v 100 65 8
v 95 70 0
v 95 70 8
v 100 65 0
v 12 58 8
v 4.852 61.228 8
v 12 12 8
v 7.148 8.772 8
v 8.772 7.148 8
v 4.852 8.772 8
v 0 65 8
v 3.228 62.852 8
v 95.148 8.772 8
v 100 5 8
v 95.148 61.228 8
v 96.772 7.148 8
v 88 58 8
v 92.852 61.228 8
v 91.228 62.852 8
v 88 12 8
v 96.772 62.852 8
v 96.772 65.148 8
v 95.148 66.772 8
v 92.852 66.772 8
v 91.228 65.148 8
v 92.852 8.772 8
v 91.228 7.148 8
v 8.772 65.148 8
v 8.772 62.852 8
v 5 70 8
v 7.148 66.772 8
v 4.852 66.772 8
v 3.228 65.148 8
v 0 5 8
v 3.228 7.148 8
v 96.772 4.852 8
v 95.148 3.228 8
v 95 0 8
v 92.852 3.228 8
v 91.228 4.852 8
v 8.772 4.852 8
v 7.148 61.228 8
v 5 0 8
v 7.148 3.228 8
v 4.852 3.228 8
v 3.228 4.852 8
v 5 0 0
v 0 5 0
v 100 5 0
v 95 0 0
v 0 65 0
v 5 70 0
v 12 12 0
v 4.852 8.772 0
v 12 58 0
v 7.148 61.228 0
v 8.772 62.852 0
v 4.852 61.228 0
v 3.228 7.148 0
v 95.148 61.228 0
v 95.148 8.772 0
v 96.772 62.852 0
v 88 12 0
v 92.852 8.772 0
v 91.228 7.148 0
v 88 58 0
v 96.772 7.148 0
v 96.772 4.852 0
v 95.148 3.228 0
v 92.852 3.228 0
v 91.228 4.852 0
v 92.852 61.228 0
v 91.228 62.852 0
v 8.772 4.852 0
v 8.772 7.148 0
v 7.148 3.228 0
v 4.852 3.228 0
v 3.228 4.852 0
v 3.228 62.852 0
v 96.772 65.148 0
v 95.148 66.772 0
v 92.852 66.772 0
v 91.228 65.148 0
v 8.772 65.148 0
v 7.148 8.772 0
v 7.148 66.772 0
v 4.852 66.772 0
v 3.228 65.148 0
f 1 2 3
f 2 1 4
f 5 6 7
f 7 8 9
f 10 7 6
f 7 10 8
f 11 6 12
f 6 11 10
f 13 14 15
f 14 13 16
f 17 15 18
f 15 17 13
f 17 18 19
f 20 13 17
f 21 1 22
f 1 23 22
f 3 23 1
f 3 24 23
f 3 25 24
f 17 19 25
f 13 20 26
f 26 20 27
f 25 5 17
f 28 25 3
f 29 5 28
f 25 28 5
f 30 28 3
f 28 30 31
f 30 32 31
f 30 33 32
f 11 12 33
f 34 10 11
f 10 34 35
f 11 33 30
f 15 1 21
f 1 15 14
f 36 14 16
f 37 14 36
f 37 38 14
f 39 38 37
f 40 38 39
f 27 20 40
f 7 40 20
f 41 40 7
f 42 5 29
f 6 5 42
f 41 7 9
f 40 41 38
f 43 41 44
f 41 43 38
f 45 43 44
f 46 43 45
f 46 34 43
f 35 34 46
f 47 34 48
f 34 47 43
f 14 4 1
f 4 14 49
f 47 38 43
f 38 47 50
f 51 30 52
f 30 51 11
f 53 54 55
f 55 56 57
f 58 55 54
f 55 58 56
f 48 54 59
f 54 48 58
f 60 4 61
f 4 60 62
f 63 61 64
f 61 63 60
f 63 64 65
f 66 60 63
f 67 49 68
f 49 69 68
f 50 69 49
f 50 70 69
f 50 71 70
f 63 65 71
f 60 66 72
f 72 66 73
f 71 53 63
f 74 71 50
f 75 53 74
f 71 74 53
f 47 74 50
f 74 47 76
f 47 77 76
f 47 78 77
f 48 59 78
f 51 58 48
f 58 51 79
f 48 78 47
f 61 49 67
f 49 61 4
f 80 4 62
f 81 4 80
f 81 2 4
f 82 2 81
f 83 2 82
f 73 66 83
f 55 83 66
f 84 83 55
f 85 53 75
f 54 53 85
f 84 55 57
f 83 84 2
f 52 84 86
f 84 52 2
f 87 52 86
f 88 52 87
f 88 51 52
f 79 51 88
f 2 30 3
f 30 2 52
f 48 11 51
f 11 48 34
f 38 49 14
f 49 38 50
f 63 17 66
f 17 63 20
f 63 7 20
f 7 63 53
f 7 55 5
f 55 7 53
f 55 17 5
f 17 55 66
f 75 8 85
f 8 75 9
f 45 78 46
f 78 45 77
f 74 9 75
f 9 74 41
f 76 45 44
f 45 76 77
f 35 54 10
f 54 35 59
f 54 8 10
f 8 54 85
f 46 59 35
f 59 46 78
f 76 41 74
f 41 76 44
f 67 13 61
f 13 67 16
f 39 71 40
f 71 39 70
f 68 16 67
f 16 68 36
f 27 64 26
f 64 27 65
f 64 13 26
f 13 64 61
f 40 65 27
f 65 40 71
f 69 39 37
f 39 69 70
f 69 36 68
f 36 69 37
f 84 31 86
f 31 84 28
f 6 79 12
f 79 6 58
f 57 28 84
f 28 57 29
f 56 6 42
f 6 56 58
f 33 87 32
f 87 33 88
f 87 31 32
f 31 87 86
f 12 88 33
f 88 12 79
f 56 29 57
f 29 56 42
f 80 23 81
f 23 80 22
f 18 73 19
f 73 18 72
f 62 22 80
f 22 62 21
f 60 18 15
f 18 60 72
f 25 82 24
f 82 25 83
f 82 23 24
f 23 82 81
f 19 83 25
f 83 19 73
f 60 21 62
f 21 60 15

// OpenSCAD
$fn = 32;

// ----------------------------------------------------------------------
// Frame plate: 100 x 70 frame, 12 mm rails
// ----------------------------------------------------------------------

// --- parameters (mm) ---
plate_l = 100;            // plate length, X
plate_w = 70;             // plate width, Y
plate_t = 8;              // plate thickness, Z (extrusion height)
corner_c = 5;             // corner chamfer
frame_bar = 12;           // frame rail width
bolt_r = 3;               // corner bolt window radius
bolt_inset = 6;           // bolt centre inset from the edges

win_l = plate_l - 2 * frame_bar;  // window length
win_w = plate_w - 2 * frame_bar;  // window width
bolt_d = 2 * bolt_r;  // corner hole diameter

profile = [[5, 0], [95, 0], [100, 5], [100, 65], [95, 70], [5, 70], [0, 65], [0, 5]];  // primary outline, 8 points, counter clockwise
void_1 = [[12, 12], [88, 12], [88, 58], [12, 58]];  // the window, 4 points
void_2 = [[8.772, 7.148], [7.148, 8.772], [4.852, 8.772], [3.228, 7.148], [3.228, 4.852], [4.852, 3.228], [7.148, 3.228], [8.772, 4.852]];  // corner bolt window, 8 points
void_3 = [[96.772, 7.148], [95.148, 8.772], [92.852, 8.772], [91.228, 7.148], [91.228, 4.852], [92.852, 3.228], [95.148, 3.228], [96.772, 4.852]];  // corner bolt window, 8 points
void_4 = [[8.772, 65.148], [7.148, 66.772], [4.852, 66.772], [3.228, 65.148], [3.228, 62.852], [4.852, 61.228], [7.148, 61.228], [8.772, 62.852]];  // corner bolt window, 8 points
void_5 = [[96.772, 65.148], [95.148, 66.772], [92.852, 66.772], [91.228, 65.148], [91.228, 62.852], [92.852, 61.228], [95.148, 61.228], [96.772, 62.852]];  // corner bolt window, 8 points

// --- the one profile operation ---
difference() {
  linear_extrude(height = plate_t) polygon(points = profile);
  translate([0, 0, -1])
    linear_extrude(height = plate_t + 2) polygon(points = void_1);
  translate([0, 0, -1])
    linear_extrude(height = plate_t + 2) polygon(points = void_2);
  translate([0, 0, -1])
    linear_extrude(height = plate_t + 2) polygon(points = void_3);
  translate([0, 0, -1])
    linear_extrude(height = plate_t + 2) polygon(points = void_4);
  translate([0, 0, -1])
    linear_extrude(height = plate_t + 2) polygon(points = void_5);
}
